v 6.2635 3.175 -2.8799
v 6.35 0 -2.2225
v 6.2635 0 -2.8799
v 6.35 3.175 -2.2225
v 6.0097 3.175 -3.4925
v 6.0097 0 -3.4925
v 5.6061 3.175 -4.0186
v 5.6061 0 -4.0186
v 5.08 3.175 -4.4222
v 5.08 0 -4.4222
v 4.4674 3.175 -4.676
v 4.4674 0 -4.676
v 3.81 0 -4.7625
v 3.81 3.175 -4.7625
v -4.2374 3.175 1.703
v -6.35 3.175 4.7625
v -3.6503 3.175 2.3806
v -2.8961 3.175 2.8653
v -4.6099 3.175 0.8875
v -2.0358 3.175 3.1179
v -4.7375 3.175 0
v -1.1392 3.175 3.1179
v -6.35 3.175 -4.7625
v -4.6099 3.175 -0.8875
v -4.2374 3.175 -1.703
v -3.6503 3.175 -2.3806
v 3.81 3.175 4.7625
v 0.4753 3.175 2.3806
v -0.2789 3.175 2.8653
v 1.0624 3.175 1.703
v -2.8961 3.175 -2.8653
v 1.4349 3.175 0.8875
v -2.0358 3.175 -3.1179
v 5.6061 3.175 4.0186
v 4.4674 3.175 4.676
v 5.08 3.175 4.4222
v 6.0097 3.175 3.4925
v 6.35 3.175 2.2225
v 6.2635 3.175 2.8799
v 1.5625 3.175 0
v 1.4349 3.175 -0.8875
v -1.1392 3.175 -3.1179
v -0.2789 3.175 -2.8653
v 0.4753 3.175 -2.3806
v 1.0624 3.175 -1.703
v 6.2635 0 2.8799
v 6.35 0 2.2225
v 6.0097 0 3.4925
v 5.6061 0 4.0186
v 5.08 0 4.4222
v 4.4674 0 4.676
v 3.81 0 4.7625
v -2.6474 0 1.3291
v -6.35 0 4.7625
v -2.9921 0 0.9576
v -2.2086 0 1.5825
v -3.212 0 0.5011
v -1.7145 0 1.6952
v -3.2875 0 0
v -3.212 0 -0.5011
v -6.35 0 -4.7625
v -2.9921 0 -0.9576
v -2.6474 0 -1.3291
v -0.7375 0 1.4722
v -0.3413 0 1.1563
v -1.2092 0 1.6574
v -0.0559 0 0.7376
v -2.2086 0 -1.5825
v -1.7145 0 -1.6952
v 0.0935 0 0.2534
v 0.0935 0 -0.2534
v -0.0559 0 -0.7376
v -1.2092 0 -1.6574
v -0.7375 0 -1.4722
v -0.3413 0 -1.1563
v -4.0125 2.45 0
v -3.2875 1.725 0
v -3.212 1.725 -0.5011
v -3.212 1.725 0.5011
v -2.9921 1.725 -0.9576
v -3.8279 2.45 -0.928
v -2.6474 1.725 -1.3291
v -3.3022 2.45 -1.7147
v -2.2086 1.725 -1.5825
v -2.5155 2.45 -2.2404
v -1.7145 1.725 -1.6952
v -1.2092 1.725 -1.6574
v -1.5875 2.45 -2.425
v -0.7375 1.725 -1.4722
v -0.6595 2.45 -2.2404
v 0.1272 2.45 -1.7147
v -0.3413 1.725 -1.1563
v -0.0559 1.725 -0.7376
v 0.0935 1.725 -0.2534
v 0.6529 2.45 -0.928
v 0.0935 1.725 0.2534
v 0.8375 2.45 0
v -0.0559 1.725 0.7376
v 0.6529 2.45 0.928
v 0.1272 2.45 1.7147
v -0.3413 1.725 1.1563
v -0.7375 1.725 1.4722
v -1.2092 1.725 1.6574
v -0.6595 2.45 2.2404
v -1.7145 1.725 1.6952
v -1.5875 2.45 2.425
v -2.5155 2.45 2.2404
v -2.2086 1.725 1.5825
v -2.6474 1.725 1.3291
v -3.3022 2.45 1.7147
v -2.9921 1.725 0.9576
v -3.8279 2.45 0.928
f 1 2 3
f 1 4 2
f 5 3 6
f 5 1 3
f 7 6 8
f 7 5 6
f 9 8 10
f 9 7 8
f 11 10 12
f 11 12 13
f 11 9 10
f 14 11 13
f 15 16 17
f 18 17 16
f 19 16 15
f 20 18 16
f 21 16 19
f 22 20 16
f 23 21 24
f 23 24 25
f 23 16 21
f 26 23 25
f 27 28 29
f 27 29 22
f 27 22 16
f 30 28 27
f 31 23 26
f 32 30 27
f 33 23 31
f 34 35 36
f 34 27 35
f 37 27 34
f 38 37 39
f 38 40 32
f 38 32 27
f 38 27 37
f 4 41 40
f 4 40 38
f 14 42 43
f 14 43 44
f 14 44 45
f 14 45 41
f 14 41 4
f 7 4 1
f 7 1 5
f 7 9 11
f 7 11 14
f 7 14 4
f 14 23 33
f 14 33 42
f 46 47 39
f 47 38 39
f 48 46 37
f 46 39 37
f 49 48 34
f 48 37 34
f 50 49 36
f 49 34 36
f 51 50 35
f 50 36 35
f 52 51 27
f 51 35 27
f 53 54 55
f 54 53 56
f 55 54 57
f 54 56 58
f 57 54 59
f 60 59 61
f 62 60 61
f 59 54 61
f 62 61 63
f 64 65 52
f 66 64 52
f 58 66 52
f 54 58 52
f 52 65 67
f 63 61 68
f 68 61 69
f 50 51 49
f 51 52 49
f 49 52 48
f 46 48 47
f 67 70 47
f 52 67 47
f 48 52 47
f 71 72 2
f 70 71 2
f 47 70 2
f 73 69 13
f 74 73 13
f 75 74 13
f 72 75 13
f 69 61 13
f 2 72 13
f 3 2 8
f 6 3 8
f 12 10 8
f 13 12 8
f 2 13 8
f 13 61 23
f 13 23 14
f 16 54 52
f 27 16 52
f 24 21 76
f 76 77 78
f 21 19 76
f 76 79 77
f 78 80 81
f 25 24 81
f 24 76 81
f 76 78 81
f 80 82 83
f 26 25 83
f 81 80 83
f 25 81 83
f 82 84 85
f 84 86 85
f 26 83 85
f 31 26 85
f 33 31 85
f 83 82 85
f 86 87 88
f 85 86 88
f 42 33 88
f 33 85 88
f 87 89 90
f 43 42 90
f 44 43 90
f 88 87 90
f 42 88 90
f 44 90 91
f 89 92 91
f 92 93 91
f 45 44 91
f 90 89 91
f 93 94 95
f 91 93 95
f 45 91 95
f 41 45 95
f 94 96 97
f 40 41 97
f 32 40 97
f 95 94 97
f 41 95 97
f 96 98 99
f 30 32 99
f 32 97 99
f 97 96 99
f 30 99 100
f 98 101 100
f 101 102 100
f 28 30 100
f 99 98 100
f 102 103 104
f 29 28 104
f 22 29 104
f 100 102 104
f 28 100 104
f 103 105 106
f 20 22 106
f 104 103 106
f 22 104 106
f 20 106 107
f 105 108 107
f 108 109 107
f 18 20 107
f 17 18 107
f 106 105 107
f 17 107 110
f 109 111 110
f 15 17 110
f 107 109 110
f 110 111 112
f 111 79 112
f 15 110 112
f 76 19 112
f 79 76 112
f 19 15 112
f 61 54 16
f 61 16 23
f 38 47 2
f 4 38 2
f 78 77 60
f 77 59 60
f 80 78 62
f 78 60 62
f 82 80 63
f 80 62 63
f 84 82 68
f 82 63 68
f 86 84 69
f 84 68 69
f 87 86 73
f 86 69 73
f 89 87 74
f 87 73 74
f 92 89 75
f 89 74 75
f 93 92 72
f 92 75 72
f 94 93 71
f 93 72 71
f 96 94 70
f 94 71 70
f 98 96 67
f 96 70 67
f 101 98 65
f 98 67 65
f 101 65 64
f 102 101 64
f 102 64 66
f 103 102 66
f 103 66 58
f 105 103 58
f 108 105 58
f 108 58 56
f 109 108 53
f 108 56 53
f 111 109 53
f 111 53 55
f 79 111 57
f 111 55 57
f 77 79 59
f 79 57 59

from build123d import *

# Parameters (mm, degrees)
SKETCH1_W                                       = 12.7
SKETCH1_H                                       = 9.525
BOSS_EXTRUDE1_DEPTH                             = 3.175
CSK_FOR_M3_FLAT_HEAD_MACHINE_SCREW1_D           = 3.4
CSK_FOR_M3_FLAT_HEAD_MACHINE_SCREW1_CSINK_D     = 6.3
CSK_FOR_M3_FLAT_HEAD_MACHINE_SCREW1_CSINK_ANGLE = 90
FILLET1_R                                       = 2.54


with BuildPart() as part:
    # Sketch1 → Boss-Extrude1 (new body)
    with BuildSketch(Plane(origin=(0, 0, 0), x_dir=(1, 0, 0), z_dir=(0, 1, 0))):
        Rectangle(SKETCH1_W, SKETCH1_H)
    extrude(amount=BOSS_EXTRUDE1_DEPTH)

    # CSK for M3 Flat Head Machine Screw1 (through all)
    with Locations(Plane(origin=(0, 3.175, 0), x_dir=(1, 0, 0), z_dir=(0, 1, 0))):
        with Locations((-1.5875, 0)):
            CounterSinkHole(CSK_FOR_M3_FLAT_HEAD_MACHINE_SCREW1_D / 2, CSK_FOR_M3_FLAT_HEAD_MACHINE_SCREW1_CSINK_D / 2, counter_sink_angle=CSK_FOR_M3_FLAT_HEAD_MACHINE_SCREW1_CSINK_ANGLE)

    # Fillet1
    fillet1_edges = [part.edges().sort_by_distance(p)[0] for p in [
        (6.35, 1.5875, -4.7625),
        (6.35, 1.5875, 4.7625),
    ]]
    fillet(fillet1_edges, radius=FILLET1_R)


solid = part.part
